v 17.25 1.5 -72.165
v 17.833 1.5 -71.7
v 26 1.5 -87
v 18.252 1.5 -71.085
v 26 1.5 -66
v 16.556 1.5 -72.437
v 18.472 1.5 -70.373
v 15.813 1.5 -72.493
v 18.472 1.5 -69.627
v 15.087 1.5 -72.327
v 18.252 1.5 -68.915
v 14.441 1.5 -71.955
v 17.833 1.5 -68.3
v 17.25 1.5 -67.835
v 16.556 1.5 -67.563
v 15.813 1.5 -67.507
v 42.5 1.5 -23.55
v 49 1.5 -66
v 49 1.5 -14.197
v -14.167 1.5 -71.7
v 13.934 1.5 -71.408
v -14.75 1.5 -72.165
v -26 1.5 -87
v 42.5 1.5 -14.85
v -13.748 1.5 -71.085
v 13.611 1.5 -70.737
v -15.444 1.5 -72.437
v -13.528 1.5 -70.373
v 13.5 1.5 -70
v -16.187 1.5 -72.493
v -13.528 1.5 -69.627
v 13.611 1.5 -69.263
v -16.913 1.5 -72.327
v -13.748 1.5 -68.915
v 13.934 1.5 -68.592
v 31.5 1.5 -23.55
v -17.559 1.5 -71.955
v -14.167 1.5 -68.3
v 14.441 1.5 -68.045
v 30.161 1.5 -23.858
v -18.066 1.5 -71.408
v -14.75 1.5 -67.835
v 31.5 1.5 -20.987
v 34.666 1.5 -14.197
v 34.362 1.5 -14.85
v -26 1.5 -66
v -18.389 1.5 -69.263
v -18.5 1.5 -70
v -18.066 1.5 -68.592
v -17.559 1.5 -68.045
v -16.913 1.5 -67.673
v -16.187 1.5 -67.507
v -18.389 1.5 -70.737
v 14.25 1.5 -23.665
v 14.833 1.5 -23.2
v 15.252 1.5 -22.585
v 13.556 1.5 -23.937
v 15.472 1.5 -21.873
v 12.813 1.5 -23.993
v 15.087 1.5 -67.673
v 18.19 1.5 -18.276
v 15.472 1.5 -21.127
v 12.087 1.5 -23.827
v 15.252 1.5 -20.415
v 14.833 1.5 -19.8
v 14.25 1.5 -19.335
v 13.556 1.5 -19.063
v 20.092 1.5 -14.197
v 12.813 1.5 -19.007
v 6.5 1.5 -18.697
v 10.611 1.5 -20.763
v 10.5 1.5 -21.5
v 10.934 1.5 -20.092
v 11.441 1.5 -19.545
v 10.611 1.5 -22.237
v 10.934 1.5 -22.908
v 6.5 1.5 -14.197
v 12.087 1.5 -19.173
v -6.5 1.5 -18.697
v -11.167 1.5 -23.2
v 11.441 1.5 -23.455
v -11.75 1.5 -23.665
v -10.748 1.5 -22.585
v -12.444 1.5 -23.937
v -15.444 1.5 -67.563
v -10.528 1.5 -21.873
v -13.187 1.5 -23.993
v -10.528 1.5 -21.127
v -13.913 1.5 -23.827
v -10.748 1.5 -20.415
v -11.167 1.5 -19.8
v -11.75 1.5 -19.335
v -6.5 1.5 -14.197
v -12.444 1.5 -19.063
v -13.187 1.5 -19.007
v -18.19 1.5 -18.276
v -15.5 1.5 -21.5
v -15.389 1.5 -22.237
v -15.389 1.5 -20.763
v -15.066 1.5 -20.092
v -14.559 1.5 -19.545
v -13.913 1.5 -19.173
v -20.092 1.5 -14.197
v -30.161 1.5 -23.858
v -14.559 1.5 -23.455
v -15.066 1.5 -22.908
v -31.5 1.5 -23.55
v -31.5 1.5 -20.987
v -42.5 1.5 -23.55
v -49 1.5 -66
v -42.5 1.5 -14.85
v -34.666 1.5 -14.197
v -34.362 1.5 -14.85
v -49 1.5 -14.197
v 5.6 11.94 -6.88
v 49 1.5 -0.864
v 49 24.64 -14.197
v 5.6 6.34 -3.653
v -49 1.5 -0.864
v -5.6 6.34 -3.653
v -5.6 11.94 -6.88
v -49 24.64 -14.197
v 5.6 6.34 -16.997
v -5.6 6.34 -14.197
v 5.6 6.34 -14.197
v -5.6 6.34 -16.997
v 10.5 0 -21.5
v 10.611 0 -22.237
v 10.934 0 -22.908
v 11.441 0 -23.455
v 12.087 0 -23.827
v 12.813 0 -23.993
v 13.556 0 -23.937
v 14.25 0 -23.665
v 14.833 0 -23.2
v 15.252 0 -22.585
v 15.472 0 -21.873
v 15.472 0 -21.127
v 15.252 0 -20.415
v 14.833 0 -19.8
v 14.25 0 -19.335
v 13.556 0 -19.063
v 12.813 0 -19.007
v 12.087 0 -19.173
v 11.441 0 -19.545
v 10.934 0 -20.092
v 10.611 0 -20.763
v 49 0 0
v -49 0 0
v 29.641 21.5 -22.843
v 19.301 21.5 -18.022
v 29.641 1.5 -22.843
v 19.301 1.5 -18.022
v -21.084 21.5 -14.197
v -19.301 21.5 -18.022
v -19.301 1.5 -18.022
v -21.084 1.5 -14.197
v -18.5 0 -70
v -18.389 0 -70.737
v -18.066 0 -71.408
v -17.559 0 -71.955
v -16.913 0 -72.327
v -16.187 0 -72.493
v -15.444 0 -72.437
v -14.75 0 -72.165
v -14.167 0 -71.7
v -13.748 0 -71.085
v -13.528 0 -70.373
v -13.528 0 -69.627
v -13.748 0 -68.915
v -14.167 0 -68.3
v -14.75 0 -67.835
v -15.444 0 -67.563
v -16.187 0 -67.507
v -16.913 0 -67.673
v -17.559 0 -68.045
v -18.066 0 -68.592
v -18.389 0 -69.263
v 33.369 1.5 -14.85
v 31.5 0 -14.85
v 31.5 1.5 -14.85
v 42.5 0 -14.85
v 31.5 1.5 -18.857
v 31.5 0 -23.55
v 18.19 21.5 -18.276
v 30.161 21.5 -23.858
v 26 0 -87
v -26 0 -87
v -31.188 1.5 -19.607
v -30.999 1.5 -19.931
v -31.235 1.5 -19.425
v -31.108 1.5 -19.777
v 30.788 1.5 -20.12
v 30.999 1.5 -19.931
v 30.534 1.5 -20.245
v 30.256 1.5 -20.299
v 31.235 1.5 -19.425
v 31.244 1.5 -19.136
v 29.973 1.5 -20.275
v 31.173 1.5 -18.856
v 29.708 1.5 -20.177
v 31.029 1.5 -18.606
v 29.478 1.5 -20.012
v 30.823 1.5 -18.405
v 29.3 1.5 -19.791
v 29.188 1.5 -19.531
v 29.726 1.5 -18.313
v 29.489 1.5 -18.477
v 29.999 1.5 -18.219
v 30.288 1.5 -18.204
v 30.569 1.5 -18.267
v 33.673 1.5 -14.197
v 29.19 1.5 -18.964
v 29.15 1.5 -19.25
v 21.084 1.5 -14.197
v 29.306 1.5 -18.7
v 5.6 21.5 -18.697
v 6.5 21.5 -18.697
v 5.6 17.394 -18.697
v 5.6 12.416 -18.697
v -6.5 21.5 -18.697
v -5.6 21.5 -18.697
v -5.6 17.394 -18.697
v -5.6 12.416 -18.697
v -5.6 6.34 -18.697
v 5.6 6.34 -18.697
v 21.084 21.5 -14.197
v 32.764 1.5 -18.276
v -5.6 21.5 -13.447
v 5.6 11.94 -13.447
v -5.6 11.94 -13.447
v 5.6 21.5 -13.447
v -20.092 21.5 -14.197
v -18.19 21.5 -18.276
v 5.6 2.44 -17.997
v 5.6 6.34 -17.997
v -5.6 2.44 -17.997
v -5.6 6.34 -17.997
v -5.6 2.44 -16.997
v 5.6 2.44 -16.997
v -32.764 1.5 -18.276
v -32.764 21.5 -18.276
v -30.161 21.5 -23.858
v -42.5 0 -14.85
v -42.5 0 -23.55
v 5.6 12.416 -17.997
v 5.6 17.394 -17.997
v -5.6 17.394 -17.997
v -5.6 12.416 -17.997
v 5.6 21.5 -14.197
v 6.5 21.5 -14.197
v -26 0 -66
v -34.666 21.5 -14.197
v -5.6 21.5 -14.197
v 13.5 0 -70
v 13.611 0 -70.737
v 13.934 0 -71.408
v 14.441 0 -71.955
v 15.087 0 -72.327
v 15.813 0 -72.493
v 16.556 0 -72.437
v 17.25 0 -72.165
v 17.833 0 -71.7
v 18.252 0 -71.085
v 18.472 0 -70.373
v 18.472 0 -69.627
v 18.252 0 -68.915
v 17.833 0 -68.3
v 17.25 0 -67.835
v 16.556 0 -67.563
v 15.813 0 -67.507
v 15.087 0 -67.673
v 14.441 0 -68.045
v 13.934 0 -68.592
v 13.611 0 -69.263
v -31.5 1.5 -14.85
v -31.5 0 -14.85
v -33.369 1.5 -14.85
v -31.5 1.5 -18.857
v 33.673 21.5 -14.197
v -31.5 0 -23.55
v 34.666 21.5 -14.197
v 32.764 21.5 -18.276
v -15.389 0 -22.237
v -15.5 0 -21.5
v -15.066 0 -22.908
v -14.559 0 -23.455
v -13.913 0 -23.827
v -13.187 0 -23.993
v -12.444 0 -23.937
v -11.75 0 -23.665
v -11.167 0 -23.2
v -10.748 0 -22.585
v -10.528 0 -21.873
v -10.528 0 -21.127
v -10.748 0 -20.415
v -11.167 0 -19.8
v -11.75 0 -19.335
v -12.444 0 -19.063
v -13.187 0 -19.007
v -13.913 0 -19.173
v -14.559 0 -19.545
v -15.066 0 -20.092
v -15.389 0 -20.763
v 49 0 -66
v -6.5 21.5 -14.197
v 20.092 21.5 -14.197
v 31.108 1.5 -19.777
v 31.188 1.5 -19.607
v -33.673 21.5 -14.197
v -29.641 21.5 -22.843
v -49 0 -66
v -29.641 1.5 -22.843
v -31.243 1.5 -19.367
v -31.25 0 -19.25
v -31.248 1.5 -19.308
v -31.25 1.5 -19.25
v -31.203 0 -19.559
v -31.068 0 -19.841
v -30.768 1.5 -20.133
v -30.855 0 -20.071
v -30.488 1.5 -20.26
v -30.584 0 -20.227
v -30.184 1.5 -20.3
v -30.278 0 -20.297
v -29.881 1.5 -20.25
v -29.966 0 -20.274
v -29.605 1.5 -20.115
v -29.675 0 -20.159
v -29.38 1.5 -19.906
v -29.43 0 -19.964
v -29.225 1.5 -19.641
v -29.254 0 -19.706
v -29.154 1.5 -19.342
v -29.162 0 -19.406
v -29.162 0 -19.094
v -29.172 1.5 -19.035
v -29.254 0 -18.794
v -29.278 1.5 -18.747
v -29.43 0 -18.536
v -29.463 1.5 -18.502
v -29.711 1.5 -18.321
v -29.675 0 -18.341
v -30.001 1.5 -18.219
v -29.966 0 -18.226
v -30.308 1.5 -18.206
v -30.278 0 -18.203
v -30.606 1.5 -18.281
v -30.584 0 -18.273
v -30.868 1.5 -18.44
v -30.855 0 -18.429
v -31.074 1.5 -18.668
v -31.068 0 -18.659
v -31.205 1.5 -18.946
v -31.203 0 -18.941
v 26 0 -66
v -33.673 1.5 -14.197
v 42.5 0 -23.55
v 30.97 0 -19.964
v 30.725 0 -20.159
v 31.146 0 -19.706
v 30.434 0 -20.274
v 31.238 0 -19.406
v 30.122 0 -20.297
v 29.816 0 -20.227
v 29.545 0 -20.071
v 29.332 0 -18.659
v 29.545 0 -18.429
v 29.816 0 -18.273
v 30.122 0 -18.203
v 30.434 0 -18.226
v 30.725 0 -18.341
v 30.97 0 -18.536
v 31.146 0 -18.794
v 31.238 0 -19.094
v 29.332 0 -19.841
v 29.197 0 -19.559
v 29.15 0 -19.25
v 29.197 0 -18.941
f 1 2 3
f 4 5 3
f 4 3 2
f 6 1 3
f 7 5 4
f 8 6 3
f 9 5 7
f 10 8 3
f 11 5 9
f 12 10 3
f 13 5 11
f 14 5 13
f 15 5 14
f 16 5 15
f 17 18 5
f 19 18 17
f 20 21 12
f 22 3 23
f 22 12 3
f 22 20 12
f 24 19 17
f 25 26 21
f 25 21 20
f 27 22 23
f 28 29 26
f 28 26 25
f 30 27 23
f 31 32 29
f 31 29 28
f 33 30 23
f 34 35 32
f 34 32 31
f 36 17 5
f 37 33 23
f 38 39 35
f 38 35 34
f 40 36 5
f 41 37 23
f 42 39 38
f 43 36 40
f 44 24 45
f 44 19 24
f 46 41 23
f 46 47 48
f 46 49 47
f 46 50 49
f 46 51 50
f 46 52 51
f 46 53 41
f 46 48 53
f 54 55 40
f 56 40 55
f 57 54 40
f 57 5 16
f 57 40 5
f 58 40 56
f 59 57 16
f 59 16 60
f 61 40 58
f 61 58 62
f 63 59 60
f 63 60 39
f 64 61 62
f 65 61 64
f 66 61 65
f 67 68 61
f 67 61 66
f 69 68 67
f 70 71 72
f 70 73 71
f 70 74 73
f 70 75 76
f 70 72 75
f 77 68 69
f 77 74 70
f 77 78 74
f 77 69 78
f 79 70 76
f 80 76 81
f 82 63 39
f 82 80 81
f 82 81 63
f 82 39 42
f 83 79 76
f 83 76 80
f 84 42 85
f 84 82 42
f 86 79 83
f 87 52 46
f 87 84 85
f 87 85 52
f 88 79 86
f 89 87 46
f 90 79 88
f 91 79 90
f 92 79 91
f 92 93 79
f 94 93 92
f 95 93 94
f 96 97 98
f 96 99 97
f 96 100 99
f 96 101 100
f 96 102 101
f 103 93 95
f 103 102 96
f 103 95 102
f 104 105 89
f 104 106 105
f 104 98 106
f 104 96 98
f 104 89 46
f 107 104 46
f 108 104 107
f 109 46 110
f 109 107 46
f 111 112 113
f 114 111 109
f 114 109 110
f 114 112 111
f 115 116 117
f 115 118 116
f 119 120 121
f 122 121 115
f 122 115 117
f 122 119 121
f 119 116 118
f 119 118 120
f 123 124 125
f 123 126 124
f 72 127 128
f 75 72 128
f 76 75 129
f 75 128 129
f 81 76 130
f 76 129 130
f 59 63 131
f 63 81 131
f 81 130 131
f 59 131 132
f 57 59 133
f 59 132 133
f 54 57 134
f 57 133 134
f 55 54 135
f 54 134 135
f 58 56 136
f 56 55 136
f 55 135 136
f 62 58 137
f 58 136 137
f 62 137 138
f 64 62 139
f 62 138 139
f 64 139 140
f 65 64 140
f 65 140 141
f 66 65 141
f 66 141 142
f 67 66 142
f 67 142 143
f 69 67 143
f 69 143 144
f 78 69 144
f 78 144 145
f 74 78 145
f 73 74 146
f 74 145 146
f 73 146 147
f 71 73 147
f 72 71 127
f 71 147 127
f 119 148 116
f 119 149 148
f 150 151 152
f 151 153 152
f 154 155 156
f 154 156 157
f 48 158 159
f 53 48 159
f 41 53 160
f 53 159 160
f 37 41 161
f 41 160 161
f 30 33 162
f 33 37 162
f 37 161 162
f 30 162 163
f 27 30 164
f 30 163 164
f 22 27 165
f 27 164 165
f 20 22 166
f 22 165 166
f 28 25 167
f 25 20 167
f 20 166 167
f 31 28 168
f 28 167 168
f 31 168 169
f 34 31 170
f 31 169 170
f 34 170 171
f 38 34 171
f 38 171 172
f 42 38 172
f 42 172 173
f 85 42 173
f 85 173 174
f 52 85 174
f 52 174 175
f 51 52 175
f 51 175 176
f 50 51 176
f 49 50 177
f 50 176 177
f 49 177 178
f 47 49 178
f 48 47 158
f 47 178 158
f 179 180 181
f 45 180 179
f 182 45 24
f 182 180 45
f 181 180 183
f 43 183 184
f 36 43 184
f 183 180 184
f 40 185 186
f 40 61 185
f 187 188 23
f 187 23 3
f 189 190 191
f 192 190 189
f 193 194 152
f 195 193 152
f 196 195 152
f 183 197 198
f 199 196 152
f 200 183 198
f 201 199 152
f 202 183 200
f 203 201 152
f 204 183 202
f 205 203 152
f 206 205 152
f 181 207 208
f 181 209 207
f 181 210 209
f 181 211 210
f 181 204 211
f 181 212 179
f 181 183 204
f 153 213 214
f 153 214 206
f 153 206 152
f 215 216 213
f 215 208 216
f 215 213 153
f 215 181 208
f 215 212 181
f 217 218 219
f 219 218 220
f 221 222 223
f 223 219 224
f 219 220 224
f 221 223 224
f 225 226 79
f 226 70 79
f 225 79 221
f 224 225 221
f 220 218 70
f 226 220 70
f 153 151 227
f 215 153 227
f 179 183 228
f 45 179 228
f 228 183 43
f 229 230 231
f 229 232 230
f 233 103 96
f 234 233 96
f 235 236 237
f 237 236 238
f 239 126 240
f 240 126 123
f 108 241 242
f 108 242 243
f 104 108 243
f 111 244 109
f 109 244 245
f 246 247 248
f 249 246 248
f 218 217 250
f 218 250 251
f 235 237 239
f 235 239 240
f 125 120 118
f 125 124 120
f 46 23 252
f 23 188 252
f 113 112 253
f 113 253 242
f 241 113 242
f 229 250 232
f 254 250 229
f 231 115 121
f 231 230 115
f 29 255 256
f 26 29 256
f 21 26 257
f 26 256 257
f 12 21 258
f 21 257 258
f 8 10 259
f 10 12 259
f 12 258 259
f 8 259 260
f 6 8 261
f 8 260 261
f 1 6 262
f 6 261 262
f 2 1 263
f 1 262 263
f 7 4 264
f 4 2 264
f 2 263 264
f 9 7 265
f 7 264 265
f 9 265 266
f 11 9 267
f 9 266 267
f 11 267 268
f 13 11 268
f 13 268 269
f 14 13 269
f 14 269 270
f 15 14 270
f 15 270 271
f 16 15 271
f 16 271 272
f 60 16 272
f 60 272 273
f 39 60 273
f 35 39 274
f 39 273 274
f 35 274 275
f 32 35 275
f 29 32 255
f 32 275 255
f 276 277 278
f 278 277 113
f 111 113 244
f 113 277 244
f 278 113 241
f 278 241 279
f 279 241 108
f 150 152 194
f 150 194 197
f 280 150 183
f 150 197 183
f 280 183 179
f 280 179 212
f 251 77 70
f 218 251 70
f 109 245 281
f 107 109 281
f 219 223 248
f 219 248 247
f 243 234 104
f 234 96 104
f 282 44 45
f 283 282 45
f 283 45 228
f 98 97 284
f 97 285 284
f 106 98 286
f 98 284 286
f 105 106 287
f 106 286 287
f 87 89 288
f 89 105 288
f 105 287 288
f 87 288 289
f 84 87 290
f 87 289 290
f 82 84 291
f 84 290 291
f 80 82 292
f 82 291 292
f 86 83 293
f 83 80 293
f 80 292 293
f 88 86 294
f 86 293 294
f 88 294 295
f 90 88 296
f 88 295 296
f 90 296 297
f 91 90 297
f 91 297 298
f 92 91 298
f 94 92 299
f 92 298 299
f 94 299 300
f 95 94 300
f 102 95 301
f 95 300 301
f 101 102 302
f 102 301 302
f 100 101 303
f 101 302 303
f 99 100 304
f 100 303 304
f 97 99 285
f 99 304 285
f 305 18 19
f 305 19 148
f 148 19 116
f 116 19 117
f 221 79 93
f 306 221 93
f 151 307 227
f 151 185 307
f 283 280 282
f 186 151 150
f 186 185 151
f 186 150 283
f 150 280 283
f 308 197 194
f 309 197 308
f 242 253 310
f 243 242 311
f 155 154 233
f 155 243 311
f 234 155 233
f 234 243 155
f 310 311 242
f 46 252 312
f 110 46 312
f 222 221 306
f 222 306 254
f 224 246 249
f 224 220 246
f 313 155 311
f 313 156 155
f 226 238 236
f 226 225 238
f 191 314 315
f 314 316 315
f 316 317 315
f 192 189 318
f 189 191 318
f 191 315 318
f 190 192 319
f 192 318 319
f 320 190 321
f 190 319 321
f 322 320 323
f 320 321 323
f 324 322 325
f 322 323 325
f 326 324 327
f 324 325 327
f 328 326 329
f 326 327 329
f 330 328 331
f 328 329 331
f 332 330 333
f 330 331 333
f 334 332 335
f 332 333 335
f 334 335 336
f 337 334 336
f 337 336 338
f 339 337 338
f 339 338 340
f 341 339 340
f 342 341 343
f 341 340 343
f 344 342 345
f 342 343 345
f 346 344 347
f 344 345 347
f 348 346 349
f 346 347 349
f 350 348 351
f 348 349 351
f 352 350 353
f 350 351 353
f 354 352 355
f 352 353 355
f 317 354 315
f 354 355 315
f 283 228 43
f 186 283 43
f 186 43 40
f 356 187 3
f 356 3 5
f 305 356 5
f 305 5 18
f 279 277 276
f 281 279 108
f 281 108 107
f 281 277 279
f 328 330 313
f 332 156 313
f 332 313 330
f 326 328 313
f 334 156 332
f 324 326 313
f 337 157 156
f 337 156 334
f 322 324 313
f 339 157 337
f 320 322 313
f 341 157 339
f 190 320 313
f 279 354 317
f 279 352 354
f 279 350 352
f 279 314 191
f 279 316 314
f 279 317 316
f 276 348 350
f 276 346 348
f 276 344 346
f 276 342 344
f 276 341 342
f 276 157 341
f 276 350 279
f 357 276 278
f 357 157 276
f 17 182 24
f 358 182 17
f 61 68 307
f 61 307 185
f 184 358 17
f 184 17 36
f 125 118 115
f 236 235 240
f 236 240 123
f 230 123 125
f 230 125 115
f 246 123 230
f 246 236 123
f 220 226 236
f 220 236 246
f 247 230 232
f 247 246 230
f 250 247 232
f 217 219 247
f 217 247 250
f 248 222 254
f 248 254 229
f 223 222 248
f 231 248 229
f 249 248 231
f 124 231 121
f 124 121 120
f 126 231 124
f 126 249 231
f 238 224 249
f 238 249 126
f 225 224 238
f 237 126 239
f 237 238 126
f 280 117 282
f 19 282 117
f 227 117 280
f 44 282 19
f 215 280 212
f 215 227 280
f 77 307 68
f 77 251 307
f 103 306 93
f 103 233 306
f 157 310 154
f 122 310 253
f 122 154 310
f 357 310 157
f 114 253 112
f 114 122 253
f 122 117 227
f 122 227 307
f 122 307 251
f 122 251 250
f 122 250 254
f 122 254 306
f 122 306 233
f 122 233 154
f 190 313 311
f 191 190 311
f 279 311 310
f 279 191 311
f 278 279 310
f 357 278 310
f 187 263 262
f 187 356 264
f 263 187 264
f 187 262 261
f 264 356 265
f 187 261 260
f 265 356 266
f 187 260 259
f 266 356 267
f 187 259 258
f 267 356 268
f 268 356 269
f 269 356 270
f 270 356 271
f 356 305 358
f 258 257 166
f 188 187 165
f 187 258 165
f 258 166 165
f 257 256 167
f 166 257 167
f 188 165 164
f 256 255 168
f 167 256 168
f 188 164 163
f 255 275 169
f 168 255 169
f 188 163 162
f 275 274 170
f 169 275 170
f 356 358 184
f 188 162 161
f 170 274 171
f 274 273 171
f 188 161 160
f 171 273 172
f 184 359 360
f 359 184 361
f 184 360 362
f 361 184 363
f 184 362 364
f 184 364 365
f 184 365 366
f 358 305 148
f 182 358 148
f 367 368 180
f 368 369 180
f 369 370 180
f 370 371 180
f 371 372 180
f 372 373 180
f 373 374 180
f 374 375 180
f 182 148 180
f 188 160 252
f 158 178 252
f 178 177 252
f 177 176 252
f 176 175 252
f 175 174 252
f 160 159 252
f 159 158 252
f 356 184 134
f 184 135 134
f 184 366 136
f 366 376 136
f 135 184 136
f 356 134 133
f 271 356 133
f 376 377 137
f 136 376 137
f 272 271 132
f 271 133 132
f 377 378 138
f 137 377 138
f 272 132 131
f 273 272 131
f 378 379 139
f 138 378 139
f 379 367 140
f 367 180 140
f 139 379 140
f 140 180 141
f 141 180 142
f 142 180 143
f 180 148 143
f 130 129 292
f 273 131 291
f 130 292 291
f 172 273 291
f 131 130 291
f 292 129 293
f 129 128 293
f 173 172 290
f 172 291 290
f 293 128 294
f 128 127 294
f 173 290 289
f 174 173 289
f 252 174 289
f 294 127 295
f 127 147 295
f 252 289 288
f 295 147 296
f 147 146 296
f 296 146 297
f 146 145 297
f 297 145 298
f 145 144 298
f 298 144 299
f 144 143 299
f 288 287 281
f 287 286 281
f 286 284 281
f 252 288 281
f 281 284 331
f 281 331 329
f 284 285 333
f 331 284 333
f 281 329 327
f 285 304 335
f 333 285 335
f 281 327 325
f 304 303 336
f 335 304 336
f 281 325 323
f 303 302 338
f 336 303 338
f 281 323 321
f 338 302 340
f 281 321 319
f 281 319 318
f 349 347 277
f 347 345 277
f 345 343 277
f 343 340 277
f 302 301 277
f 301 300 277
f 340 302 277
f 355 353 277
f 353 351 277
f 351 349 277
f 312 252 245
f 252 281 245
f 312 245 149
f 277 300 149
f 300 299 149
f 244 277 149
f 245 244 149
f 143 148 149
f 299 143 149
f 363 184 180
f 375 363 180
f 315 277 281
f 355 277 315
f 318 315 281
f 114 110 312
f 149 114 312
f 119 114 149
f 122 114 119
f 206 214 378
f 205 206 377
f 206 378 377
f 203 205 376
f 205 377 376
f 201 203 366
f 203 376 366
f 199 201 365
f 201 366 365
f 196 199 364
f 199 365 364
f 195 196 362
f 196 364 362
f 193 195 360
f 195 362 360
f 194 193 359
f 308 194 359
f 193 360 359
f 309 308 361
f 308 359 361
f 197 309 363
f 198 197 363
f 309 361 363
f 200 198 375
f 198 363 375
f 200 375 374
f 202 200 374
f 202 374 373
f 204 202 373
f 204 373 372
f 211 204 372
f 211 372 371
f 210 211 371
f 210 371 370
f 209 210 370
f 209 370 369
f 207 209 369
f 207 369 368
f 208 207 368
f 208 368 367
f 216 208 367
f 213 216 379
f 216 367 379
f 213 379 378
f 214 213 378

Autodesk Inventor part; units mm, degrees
ref_plane "YZ Plane" through (0, 0, 0) normal (1, 0, 0) x (0, 1, 0)
ref_plane "XZ Plane" through (0, 0, 0) normal (0, 1, 0) x (-1, 0, 0)
ref_plane "XY Plane" through (0, 0, 0) normal (0, 0, 1) x (1, 0, 0)
sketch "Boceto1" plane through (0, 0, 0) normal (0, 1, 0) x (-1, 0, 0)
  line L0 (26, -66) -> (49, -66)
  line L1 (0, -87) -> (0, 0) construction
  line L2 (49, 0) -> (49, -87)
  line L3 (-49, 0) -> (49, 0)
  line L4 (-49, -87) -> (-49, 0)
  line L5 (49, -87) -> (-49, -87)
  line L6 (26, -87) -> (26, -66)
  circle A0 centre (-41.5, -7.5) radius 1.75
  line L7 (49, -12) -> (-49, -12) construction
  circle A1 centre (41.5, -7.5) radius 1.75
  line L8 (-26, -66) -> (-49, -66)
  line L9 (-26, -87) -> (-26, -66)
  line L10 (44.5, -24.05) -> (28.5, -24.05)
  line L11 (28.5, -24.05) -> (28.5, -13.05)
  line L12 (28.5, -13.05) -> (44.5, -13.05)
  line L13 (44.5, -13.05) -> (44.5, -24.05)
  line L14 (42.5, -23.55) -> (31.5, -23.55)
  line L15 (31.5, -14.85) -> (42.5, -14.85)
  line L16 (42.5, -14.85) -> (42.5, -23.55)
  circle A2 centre (30.2, -19.25) radius 1.05
  line L17 (31.5, -14.85) -> (31.5, -23.55)
  line L18 (-42.5, -23.55) -> (-31.5, -23.55)
  line L19 (-42.5, -14.85) -> (-42.5, -23.55)
  line L20 (-31.5, -14.85) -> (-42.5, -14.85)
  line L21 (-31.5, -14.85) -> (-31.5, -23.55)
  circle A3 centre (-30.2, -19.25) radius 1.05
  circle A4 centre (13, -21.5) radius 2.5
  circle A5 centre (-13, -21.5) radius 2.5
  circle A6 centre (16, -70) radius 2.5
  circle A7 centre (-16, -70) radius 2.5
  dimension "d0" = 3.5
  dimension "d1" = 0
  dimension "d2" = 87
  dimension "d3" = 21
  dimension "d4" = 12
  dimension "d5" = 23
  dimension "d6" = 98
  dimension "d7" = 7.5
  dimension "d8" = 7.5
  dimension "d9" = 79.5
  dimension "d10" = 2.1
  dimension "d11" = 9
  dimension "d12" = 11
  dimension "d13" = 16
  dimension "d14" = 1
  dimension "d15" = 3.6
  dimension "d16" = 2.1
  dimension "d17" = 1.3
  dimension "d18" = 5
  dimension "d19" = 36
  dimension "d20" = 9.5
  dimension "d21" = 5
  dimension "d22" = 17
  dimension "d23" = 10
  dimension "d24" = 8.7
  dimension "d25" = 4.3
  dimension "d26" = 4
  dimension "d27" = 11
  dimension "d28" = 54
  dimension "d29" = 2.85
extrude "Base" add sketch "Boceto1" along normal blind 1.5 contours L6 L5 L9 L8 L4 L3 L2 L0 | L10 L11 L12 L13
sketch "Boceto2" plane through (-49, 0, -66) normal (-1, 0, 0) x (0, 0, 1)
  line L0 (66, 0) -> (0, 0)
  line L1 (66, 0) -> (65.1357, 1.5)
  line L2 (66, 0) -> (67.7312, 0) construction
  line L3 (65.1357, 1.5) -> (66, 1.5)
  line L4 (66, 0) -> (66, 1.5)
  line L5 (66, 1.5) -> (66, 0)
  dimension "d32" = 119.95
extrude "Angulo Base" cut sketch "Boceto2" against normal blind 98
sketch "Boceto3" plane through (-49, 0, -66) normal (-1, 0, 0) x (0, 0, 1)
  line L0 (0, 0) -> (66, 0) projected
  line L1 (51.8028, 0) -> (66, 0)
  line L2 (66, 0) -> (51.8028, 24.6399)
  line L3 (51.8028, 24.6399) -> (51.8028, 0)
  line L4 (66, 0) -> (65.1357, 1.5) projected
  dimension "d35" = 0
extrude "Extrusión3" add sketch "Boceto3" against normal blind 98
sketch "Boceto4" plane through (-49, 1.5, -14.1972) normal (0, 0, -1) x (-1, 0, 0)
  line L0 (-55.5, 19.6399) -> (-42.5, 19.6399)
  line L1 (-42.5, 19.6399) -> (-42.5, 0.9399)
  line L2 (-42.5, 0.9399) -> (-55.5, 0.9399)
  line L3 (-55.5, 0.9399) -> (-55.5, 19.6399)
  line L4 (-54.6, 10.4399) -> (-43.4, 10.4399)
  line L5 (-43.4, 10.4399) -> (-43.4, 4.8399)
  line L6 (-43.4, 4.8399) -> (-54.6, 4.8399)
  line L7 (-54.6, 4.8399) -> (-54.6, 10.4399)
  line L8 (0, 23.1399) -> (0, 0) projected
  line L9 (-98, 0) -> (-98, 23.1399) projected
  line L10 (0, 23.1399) -> (-98, 23.1399) projected
  line L11 (0, 0) -> (-98, 0) projected
  point P0 (-49, -1.5)
  dimension "d38" = 13
  dimension "d39" = 0.9
  dimension "d40" = 0.9
  dimension "d41" = 3.9
  dimension "d42" = 5.6
  dimension "d43" = 18.7
  dimension "d44" = 42.5
  dimension "d45" = 42.5
  dimension "d46" = 3.5
  dimension "d93" = 0.9399
extrude "Extrusión4" cut sketch "Boceto4" against normal mid plane 76.25 contours L4 L5 L6 L7
sketch "Boceto5" plane through (-49, 1.5, -14.1972) normal (0, 0, -1) x (-1, 0, 0)
  line L0 (-54.6, 19.64) -> (-43.4, 19.64)
  line L1 (-43.4, 19.64) -> (-43.4, 4.84)
  line L2 (-43.4, 4.84) -> (-54.6, 4.84)
  line L3 (-54.6, 4.84) -> (-54.6, 19.64)
  line L4 (-54.6, 4.8399) -> (-54.6, 10.4399) projected
  line L5 (-43.4, 10.4399) -> (-43.4, 4.8399) projected
  line L6 (-43.4, 4.8399) -> (-54.6, 4.8399) projected
  line L7 (-75, 0) -> (-23, 0) projected
  line L8 (0, 23.1399) -> (-98, 23.1399) projected
  point P0 (-49, -1.5)
  dimension "d49" = 11.2
  dimension "d50" = 14.8
  dimension "d76" = 4.84
extrude "Extrusión5" cut sketch "Boceto5" against normal mid plane 1.5
sketch "Boceto6" plane through (0, 1.5, 0) normal (0, 1, 0) x (1, 0, 0)
  line L0 (6.5, 13.7984) -> (-6.5, 13.7984)
  line L1 (-6.5, 13.7984) -> (-6.5, 13.8318)
  line L2 (-6.5, 13.8318) -> (6.5, 13.8318)
  line L3 (6.5, 13.8318) -> (6.5, 13.7984)
  line L4 (-6.5, 13.8318) -> (6.5, 13.8318)
  line L5 (6.5, 13.8318) -> (6.5, 18.6972)
  line L6 (6.5, 18.6972) -> (-6.5, 18.6972)
  line L7 (-6.5, 18.6972) -> (-6.5, 13.8318)
  line L8 (-49, 14.1972) -> (49, 14.1972) projected
  point P0 (0, 0)
  point P1 (-6.5, 14.1972)
  point P2 (6.5, 14.1972)
  dimension "d53" = 13
  dimension "d54" = 4.5
extrude "Extrusión6" add sketch "Boceto6" along normal blind 20 contours L8 L7 L6 L5
sketch "Boceto7" plane through (6.5, 1.5, -18.6972) normal (0, 0, -1) x (-1, 0, 0)
  line L0 (0.9, 10.916) -> (12.1, 10.916)
  line L1 (12.1, 10.916) -> (12.1, 4.84)
  line L2 (12.1, 4.84) -> (0.9, 4.84)
  line L3 (0.9, 4.84) -> (0.9, 10.916)
  line L4 (13, 0) -> (0, 0) projected
  line L5 (0, 0) -> (0, 20) projected
  line L6 (0.9, 20) -> (12.1, 20)
  line L7 (12.1, 20) -> (12.1, 15.894)
  line L8 (12.1, 15.894) -> (0.9, 15.894)
  line L9 (0.9, 15.894) -> (0.9, 20)
  line L10 (0, 20) -> (13, 20) projected
  point P0 (6.5, -1.5)
  dimension "d57" = 4.84
  dimension "d58" = 6.076
  dimension "d59" = 11.2
  dimension "d60" = 0.9
  dimension "d61" = 4.978
  dimension "d62" = 11.2
  dimension "d63" = 0.9
  dimension "d64" = 0
extrude "Extrusión7" cut sketch "Boceto7" against normal blind 5.25
sketch "Boceto8" plane through (-5.6, 17.394, -18.6972) normal (0, 1, 0) x (1, 0, 0)
  line L0 (0, 0) -> (0, -4.5) projected
  line L1 (0, -4.5) -> (11.2, -4.5)
  line L2 (11.2, -4.5) -> (11.2, -0.7)
  line L3 (11.2, -0.7) -> (0, -0.7)
  line L4 (0, -0.7) -> (0, -4.5)
  point P0 (5.6, -18.6972)
  point P1 (0, -0.7)
  dimension "d67" = 3.8
  dimension "d68" = 11.2
extrude "Extrusión8" cut sketch "Boceto8" against normal blind 10.054
sketch "Boceto9" plane through (-5.6, 6.34, -18.6972) normal (0, 1, 0) x (1, 0, 0)
  line L0 (11.2, 0) -> (11.2, -0.7) projected
  line L1 (0, 0) -> (0, -4.5) projected
  line L2 (11.2, -0.7) -> (0, -0.7)
  line L3 (0, -0.7) -> (0, -1.7)
  line L4 (0, -1.7) -> (11.2, -1.7)
  line L5 (11.2, -1.7) -> (11.2, -0.7)
  point P0 (5.6, -18.6972)
  dimension "d77" = 1
extrude "Extrusión9" cut sketch "Boceto9" against normal blind 3.9
sketch "Boceto14" plane through (0, 1.5, 0) normal (0, 1, 0) x (1, 0, 0)
  line L0 (6.5, 14.1972) -> (6.5, 18.6972) projected
  line L1 (-6.5, 14.1972) -> (6.5, 14.1972)
  line L2 (6.5, 14.1972) -> (6.5, 18.6972)
  line L3 (6.5, 18.6972) -> (-6.5, 18.6972)
  line L4 (-6.5, 18.6972) -> (-6.5, 14.1972)
  line L5 (39.9859, 2.7887) -> (25.4113, 2.7887) projected
  line L6 (25.4113, 2.7887) -> (18.1896, 18.2757)
  line L7 (39.9859, 2.7887) -> (32.7642, 18.2757)
  line L8 (34.666, 14.1972) -> (39.9859, 2.7887) projected
  line L9 (18.1896, 18.2757) -> (30.1611, 23.8581)
  line L10 (18.1896, 18.2757) -> (35.316, 18.2757) construction
  line L11 (32.7642, 18.2757) -> (30.1611, 23.8581)
  line L12 (25.4113, 2.7887) -> (37.326, 8.493)
  line L13 (-5.6, 17.9972) -> (5.6, 17.9972) projected
  line L14 (5.6, 18.6972) -> (5.6, 14.1972) projected
  line L15 (20.0915, 14.1972) -> (34.666, 14.1972) projected
  line L16 (29.6412, 22.8433) -> (33.673, 14.1972)
  line L17 (19.3012, 18.0217) -> (29.6412, 22.8433)
  line L18 (19.3012, 18.0217) -> (21.0845, 14.1972)
  line L19 (20.0915, 14.1972) -> (21.0845, 14.1972)
  line L20 (33.673, 14.1972) -> (34.666, 14.1972)
  line L21 (0, 0) -> (0, 87)
  line L22 (26, 87) -> (-26, 87) projected
  line L23 (-25.4113, 2.7887) -> (-18.1896, 18.2757)
  line L24 (-39.9859, 2.7887) -> (-32.7642, 18.2757)
  line L25 (-18.1896, 18.2757) -> (-30.1611, 23.8581)
  line L26 (-18.1896, 18.2757) -> (-35.316, 18.2757) construction
  line L27 (-32.7642, 18.2757) -> (-30.1611, 23.8581)
  line L28 (-25.4113, 2.7887) -> (-37.326, 8.493)
  line L29 (-20.0915, 14.1972) -> (-34.666, 14.1972)
  line L30 (-29.6412, 22.8433) -> (-33.673, 14.1972)
  line L31 (-19.3012, 18.0217) -> (-29.6412, 22.8433)
  line L32 (-19.3012, 18.0217) -> (-21.0845, 14.1972)
  line L33 (-20.0915, 14.1972) -> (-21.0845, 14.1972)
  dimension "d94" = 13
  dimension "d95" = 4.5
  dimension "d96" = 17.088
  dimension "d97" = 17.088
  dimension "d98" = 25
  dimension "d99" = 0.7
  dimension "d100" = 0.9
  dimension "d101" = 90
  dimension "d103" = 0.9
  dimension "d104" = 0.7
extrude "Extrusión11" add sketch "Boceto14" along normal up to surface (20 mm away) contours L6 L9 L11 L7 L15 L16 L17 L18 | L29 L32 L31 L30 L24 L27 L25 L23
sketch "Boceto15" plane through (30.1611, 1.5, -23.8581) normal (-0.4226, 0, -0.9063) x (-0.9063, 0, 0.4226)
  point P0 (37.4181, -1.5)
equation "\"Radio_pliegue\" = Grosor"
equation "\"Anchura_desahogo_plegado\" = Grosor"
equation "\"Profundidad_desahogo_plegado\" = 0.5 * Grosor"
equation "\"Tamaño_destalonado\" = 4 * Grosor"
equation "\"Remanente_mínimo\" = 2 * Grosor"
equation "\"Radiodetransición\" = Radio_pliegue"
equation "\"Tamaño_de_radio_de_Jacobi\" = Radio_pliegue"
equation "\"TamañoSeparación\" = Grosor"
equation "\"Grosor\" = 0.5"
properties part number "Onixium3"
